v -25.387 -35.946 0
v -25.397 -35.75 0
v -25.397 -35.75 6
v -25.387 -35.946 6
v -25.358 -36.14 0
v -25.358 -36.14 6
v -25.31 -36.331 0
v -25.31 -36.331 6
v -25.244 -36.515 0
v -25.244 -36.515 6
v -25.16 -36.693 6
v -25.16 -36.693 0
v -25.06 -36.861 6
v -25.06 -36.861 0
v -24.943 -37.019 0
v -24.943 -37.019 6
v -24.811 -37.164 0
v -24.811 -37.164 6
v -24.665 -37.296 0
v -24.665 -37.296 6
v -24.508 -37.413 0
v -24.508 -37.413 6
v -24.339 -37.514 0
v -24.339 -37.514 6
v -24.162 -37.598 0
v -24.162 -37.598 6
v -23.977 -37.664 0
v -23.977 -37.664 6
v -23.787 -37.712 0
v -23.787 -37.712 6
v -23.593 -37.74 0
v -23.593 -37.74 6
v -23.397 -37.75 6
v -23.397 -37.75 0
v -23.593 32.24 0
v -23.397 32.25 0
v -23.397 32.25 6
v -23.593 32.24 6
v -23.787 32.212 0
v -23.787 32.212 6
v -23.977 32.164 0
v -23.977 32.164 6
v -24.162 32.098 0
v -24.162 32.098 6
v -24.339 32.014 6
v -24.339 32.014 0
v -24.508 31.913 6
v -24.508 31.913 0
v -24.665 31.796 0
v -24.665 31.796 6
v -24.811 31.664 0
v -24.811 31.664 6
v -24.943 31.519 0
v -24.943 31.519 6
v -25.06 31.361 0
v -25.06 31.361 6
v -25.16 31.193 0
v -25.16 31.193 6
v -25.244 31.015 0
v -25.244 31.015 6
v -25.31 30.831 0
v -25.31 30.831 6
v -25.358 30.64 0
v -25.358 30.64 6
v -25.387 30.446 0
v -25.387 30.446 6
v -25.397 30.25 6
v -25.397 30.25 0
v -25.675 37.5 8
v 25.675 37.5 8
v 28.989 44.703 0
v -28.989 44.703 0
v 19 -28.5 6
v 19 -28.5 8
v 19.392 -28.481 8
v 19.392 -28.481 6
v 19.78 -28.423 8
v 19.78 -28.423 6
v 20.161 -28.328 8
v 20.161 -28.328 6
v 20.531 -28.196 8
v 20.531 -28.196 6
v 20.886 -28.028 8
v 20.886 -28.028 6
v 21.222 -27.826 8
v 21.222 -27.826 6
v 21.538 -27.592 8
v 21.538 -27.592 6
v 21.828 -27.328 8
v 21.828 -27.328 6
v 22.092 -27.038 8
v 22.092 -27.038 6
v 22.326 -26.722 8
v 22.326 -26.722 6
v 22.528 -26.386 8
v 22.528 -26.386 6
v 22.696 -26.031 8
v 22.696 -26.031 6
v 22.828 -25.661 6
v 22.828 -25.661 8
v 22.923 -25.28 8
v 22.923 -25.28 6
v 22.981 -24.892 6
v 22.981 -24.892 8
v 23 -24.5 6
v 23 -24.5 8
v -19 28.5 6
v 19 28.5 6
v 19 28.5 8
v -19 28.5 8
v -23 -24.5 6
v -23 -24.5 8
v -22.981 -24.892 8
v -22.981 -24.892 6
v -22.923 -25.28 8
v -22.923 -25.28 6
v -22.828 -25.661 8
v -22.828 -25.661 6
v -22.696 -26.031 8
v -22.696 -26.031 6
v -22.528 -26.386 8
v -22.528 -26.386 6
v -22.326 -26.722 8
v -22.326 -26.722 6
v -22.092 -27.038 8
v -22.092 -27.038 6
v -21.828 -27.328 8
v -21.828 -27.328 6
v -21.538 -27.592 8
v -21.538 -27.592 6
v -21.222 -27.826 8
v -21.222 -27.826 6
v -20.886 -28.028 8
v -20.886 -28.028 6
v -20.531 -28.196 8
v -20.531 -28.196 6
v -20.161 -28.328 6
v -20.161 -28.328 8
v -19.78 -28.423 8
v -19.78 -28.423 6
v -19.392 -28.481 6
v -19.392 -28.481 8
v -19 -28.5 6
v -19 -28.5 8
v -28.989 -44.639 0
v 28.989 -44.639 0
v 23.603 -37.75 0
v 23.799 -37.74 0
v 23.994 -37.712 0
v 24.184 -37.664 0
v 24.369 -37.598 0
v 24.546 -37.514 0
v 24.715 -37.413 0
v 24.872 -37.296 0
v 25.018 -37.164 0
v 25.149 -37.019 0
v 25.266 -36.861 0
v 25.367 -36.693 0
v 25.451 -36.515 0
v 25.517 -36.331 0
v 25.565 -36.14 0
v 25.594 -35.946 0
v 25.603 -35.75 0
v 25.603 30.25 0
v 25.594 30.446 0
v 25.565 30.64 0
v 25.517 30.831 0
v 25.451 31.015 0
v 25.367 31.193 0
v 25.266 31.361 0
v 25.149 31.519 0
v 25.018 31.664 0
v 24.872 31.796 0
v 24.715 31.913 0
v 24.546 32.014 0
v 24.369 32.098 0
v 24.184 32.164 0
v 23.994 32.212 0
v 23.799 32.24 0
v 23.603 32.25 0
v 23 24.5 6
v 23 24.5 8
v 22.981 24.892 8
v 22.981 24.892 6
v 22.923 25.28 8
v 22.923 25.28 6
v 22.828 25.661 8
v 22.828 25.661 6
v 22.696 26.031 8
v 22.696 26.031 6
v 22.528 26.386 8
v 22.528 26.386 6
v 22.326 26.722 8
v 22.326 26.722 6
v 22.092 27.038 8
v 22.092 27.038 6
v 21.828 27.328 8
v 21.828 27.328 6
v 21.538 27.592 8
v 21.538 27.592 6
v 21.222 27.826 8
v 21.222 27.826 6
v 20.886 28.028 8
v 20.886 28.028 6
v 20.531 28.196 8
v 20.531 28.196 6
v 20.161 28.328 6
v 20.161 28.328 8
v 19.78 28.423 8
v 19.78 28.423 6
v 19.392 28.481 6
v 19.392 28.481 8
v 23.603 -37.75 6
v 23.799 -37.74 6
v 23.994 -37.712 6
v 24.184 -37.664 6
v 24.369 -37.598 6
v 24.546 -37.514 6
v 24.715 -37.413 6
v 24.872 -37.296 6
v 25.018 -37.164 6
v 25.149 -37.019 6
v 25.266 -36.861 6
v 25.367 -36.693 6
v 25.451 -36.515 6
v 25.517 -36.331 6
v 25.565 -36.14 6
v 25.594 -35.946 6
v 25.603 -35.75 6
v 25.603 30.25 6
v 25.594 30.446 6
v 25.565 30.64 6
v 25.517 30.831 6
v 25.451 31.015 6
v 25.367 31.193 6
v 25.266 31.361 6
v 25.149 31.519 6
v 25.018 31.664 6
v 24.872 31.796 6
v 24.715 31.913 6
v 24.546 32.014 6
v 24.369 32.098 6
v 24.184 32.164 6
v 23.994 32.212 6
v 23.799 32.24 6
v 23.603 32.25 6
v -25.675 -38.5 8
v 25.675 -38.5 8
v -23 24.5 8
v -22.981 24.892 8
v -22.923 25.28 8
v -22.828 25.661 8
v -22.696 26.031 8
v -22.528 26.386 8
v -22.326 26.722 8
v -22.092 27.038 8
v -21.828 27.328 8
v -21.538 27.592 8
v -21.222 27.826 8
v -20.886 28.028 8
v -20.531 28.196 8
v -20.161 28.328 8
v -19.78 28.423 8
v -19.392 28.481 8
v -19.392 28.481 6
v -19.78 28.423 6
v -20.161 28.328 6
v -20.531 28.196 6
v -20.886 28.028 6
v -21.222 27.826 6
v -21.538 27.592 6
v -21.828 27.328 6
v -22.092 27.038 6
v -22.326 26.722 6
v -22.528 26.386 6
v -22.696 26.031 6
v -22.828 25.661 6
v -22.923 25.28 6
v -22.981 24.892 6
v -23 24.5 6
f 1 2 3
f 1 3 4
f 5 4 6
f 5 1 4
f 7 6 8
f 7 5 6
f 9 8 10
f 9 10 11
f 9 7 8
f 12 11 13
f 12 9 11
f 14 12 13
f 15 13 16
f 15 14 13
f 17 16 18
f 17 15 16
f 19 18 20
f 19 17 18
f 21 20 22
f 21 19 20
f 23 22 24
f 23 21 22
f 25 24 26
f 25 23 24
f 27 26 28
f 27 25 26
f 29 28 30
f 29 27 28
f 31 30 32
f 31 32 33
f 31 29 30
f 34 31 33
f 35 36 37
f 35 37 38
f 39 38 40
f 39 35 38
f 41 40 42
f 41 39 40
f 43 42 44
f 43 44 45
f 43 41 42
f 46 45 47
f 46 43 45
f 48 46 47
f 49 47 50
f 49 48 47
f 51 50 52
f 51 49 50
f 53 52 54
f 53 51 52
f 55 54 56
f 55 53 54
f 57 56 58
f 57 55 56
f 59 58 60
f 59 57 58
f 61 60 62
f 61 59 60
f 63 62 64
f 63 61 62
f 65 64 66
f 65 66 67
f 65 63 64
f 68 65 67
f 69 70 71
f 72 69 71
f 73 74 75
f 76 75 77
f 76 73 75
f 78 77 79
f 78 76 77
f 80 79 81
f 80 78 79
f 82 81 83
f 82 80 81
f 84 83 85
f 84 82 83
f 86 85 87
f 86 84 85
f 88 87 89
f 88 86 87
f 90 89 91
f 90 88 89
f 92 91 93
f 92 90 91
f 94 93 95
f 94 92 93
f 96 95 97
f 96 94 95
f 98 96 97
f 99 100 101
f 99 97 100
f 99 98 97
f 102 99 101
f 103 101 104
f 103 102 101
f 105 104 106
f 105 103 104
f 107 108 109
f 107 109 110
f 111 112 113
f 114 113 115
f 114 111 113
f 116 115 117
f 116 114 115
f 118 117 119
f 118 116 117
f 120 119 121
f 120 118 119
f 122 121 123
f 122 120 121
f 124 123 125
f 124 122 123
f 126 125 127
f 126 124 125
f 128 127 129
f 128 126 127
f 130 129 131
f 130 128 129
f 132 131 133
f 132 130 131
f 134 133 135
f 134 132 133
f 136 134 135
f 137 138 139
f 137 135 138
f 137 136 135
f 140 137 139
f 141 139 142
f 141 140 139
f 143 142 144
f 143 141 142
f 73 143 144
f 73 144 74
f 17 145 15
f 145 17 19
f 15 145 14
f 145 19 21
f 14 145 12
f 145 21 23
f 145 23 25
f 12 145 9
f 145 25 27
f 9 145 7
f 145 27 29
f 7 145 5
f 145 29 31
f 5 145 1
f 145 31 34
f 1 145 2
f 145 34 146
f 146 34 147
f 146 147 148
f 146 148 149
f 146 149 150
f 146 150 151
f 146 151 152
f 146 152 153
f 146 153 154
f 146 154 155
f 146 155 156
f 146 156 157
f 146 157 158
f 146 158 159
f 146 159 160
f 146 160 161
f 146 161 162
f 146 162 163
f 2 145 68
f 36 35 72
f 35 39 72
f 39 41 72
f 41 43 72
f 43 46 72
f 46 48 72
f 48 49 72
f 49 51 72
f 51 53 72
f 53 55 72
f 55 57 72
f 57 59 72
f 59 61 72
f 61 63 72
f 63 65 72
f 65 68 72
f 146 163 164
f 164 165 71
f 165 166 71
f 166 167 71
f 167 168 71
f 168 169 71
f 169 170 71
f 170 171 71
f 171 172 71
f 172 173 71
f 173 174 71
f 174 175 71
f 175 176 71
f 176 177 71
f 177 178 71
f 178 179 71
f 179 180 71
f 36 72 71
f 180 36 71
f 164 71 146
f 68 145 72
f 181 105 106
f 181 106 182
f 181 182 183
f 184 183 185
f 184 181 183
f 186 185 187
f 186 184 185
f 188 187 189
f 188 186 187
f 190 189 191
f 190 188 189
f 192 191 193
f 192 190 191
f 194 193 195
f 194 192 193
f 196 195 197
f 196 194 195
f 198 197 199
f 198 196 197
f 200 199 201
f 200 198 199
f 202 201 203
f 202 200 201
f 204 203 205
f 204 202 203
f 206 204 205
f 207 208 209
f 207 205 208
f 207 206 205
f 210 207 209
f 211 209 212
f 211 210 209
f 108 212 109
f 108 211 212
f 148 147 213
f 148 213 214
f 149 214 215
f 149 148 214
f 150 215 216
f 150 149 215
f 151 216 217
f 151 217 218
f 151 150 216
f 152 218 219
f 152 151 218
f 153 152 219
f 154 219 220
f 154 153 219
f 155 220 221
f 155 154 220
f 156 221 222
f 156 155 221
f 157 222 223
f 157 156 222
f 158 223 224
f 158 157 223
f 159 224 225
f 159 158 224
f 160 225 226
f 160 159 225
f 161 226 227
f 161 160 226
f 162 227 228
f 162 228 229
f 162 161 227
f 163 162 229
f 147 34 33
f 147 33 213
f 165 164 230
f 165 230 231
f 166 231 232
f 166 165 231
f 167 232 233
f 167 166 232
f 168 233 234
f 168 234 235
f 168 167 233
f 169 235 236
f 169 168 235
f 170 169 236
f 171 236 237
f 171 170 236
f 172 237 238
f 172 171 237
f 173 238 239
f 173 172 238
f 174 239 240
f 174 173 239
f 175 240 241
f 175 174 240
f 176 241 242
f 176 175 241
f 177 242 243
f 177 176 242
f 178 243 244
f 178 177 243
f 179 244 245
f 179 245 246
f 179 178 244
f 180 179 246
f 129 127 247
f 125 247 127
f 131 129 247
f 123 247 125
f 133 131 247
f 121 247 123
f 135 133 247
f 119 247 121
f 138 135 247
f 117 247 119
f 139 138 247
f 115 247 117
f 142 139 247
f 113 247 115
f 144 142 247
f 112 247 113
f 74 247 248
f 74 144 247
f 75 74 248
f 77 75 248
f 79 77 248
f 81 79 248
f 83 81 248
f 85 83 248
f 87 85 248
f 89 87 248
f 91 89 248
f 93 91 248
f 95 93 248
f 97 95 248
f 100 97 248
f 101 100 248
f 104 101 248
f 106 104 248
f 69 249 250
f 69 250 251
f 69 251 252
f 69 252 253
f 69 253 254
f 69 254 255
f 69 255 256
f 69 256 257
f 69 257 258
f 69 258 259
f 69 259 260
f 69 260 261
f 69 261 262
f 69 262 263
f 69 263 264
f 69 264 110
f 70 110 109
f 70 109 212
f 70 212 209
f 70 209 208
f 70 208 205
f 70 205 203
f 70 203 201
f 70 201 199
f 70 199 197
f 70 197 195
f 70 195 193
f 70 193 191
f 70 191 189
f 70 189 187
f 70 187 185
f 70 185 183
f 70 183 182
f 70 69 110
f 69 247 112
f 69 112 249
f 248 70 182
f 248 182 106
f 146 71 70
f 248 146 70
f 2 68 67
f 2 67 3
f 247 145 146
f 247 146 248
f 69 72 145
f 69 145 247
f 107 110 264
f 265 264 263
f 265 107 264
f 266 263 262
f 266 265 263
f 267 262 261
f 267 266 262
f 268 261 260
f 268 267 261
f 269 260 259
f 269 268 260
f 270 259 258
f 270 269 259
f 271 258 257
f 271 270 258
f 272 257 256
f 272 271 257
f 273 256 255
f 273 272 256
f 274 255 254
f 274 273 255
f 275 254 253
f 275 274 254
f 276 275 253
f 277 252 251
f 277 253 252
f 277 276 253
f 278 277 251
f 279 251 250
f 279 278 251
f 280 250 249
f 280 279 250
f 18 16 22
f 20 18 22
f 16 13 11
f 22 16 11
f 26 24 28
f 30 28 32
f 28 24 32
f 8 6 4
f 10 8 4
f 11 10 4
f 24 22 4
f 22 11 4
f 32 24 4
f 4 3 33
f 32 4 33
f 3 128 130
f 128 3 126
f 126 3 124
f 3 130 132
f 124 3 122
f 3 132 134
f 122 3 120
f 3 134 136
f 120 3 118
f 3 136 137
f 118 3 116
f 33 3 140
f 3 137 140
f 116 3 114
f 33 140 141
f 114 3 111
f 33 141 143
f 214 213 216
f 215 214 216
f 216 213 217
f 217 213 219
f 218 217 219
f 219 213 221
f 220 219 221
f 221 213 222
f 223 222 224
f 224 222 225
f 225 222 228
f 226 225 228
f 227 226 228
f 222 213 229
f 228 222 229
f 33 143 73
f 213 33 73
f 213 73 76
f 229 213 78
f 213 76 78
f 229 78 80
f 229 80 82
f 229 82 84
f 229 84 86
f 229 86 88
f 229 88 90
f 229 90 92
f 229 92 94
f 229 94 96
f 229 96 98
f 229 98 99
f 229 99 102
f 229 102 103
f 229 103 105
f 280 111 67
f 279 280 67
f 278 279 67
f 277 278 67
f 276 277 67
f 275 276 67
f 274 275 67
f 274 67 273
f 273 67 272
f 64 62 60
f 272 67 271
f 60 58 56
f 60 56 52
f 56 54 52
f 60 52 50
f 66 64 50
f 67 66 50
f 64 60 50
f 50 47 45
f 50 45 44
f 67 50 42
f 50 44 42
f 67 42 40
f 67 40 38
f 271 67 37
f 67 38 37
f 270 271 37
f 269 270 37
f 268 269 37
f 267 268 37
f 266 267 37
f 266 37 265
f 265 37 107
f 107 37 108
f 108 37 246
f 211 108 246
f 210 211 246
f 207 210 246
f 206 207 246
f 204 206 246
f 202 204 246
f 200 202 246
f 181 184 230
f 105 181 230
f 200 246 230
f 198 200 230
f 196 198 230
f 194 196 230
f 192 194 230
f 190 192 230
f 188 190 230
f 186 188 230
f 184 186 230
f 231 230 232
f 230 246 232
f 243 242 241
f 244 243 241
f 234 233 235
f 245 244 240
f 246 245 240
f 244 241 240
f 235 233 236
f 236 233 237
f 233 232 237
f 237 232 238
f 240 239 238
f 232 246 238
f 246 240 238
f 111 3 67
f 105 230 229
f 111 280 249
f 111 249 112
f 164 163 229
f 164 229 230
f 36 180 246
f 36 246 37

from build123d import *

# Parameters (mm, degrees)
F1_W        = 60
F1_H        = 93
F2_DEPTH    = 8
F3_T1_DEPTH = 147.142599219
F4_T1_DEPTH = 102.8305675527
F5_DEPTH    = 25
F6_DEPTH    = 6
F7_T1_DEPTH = 105.1482614058


# Not quite as in the source:
# - a fillet or chamfer that OpenCascade refuses, or shapes differently, is made with other operations: its cross-section is extruded or revolved along the edge and cut away or added


with BuildPart() as f2:
    # F1 (on Top) → F2 (new body)
    with BuildSketch(Plane.XY):
        Rectangle(F1_W, F1_H)
    extrude(amount=F2_DEPTH)

    # F3: chamfer of 4.325 x 10.4414736573 on 2 edges, made by hand

    # F3_s2 → F3_t1 (cut)
    with BuildSketch(Plane.XZ.offset(-73.5712996095)):
        Polygon((30, -2.4414736573), (25.675, 8), (30, 8), align=None)
        Polygon((-30, -2.4414736573), (-25.675, 8), (-30, 8), align=None)
    extrude(amount=F3_T1_DEPTH, mode=Mode.SUBTRACT)

    # F4: chamfer of 9 x 9.9955126335 on 1 edges, made by hand

    # F4_s2 → F4_t1 (cut)
    with BuildSketch(Plane.YZ.offset(-51.4152837764)):
        Polygon((37.5, 8), (46.5, -1.9955126335), (46.5, 8), align=None)
    extrude(amount=F4_T1_DEPTH, mode=Mode.SUBTRACT)

    # F0 (on Top) → F5 (cut)
    with BuildSketch(Plane.XY):
        with BuildLine():
            ThreePointArc((23, 24.5), (21.8284271247, 27.3284271247), (19, 28.5))
            Line((19, 28.5), (-19, 28.5))
            ThreePointArc((-19, 28.5), (-21.8284271247, 27.3284271247), (-23, 24.5))
            Line((-23, 24.5), (-23, -24.5))
            ThreePointArc((-23, -24.5), (-21.8284271247, -27.3284271247), (-19, -28.5))
            Line((-19, -28.5), (19, -28.5))
            ThreePointArc((19, -28.5), (21.8284271247, -27.3284271247), (23, -24.5))
            Line((23, -24.5), (23, 24.5))
        make_face()
    extrude(amount=F5_DEPTH, mode=Mode.SUBTRACT)

    # F0 (on Top) → F6 (cut)
    with BuildSketch(Plane.XY):
        with BuildLine():
            ThreePointArc((25.6034387499, 30.25), (25.0176523123, 31.6642135624), (23.6034387499, 32.25))
            Line((23.6034387499, 32.25), (-23.3965612501, 32.25))
            ThreePointArc((-23.3965612501, 32.25), (-24.8107748125, 31.6642135624), (-25.3965612501, 30.25))
            Line((-25.3965612501, 30.25), (-25.3965612501, -35.75))
            ThreePointArc((-25.3965612501, -35.75), (-24.8107748125, -37.1642135624), (-23.3965612501, -37.75))
            Line((-23.3965612501, -37.75), (23.6034387499, -37.75))
            ThreePointArc((23.6034387499, -37.75), (25.0176523123, -37.1642135624), (25.6034387499, -35.75))
            Line((25.6034387499, -35.75), (25.6034387499, 30.25))
        make_face()
        with BuildLine():
            Line((-19, 28.5), (19, 28.5))
            ThreePointArc((19, 28.5), (21.8284271247, 27.3284271247), (23, 24.5))
            Line((23, 24.5), (23, -24.5))
            ThreePointArc((23, -24.5), (21.8284271247, -27.3284271247), (19, -28.5))
            Line((19, -28.5), (-19, -28.5))
            ThreePointArc((-19, -28.5), (-21.8284271247, -27.3284271247), (-23, -24.5))
            Line((-23, -24.5), (-23, 24.5))
            ThreePointArc((-23, 24.5), (-21.8284271247, 27.3284271247), (-19, 28.5))
        make_face(mode=Mode.SUBTRACT)
    extrude(amount=F6_DEPTH, mode=Mode.SUBTRACT)

    # F7: chamfer of 8 x 10.4258029827 on 1 edges, made by hand

    # F7_s2 → F7_t1 (cut)
    with BuildSketch(Plane.YZ.offset(-52.5741307029)):
        Polygon((-46.5, -2.4258029827), (-38.5, 8), (-46.5, 8), align=None)
    extrude(amount=F7_T1_DEPTH, mode=Mode.SUBTRACT)


solid = f2.part
